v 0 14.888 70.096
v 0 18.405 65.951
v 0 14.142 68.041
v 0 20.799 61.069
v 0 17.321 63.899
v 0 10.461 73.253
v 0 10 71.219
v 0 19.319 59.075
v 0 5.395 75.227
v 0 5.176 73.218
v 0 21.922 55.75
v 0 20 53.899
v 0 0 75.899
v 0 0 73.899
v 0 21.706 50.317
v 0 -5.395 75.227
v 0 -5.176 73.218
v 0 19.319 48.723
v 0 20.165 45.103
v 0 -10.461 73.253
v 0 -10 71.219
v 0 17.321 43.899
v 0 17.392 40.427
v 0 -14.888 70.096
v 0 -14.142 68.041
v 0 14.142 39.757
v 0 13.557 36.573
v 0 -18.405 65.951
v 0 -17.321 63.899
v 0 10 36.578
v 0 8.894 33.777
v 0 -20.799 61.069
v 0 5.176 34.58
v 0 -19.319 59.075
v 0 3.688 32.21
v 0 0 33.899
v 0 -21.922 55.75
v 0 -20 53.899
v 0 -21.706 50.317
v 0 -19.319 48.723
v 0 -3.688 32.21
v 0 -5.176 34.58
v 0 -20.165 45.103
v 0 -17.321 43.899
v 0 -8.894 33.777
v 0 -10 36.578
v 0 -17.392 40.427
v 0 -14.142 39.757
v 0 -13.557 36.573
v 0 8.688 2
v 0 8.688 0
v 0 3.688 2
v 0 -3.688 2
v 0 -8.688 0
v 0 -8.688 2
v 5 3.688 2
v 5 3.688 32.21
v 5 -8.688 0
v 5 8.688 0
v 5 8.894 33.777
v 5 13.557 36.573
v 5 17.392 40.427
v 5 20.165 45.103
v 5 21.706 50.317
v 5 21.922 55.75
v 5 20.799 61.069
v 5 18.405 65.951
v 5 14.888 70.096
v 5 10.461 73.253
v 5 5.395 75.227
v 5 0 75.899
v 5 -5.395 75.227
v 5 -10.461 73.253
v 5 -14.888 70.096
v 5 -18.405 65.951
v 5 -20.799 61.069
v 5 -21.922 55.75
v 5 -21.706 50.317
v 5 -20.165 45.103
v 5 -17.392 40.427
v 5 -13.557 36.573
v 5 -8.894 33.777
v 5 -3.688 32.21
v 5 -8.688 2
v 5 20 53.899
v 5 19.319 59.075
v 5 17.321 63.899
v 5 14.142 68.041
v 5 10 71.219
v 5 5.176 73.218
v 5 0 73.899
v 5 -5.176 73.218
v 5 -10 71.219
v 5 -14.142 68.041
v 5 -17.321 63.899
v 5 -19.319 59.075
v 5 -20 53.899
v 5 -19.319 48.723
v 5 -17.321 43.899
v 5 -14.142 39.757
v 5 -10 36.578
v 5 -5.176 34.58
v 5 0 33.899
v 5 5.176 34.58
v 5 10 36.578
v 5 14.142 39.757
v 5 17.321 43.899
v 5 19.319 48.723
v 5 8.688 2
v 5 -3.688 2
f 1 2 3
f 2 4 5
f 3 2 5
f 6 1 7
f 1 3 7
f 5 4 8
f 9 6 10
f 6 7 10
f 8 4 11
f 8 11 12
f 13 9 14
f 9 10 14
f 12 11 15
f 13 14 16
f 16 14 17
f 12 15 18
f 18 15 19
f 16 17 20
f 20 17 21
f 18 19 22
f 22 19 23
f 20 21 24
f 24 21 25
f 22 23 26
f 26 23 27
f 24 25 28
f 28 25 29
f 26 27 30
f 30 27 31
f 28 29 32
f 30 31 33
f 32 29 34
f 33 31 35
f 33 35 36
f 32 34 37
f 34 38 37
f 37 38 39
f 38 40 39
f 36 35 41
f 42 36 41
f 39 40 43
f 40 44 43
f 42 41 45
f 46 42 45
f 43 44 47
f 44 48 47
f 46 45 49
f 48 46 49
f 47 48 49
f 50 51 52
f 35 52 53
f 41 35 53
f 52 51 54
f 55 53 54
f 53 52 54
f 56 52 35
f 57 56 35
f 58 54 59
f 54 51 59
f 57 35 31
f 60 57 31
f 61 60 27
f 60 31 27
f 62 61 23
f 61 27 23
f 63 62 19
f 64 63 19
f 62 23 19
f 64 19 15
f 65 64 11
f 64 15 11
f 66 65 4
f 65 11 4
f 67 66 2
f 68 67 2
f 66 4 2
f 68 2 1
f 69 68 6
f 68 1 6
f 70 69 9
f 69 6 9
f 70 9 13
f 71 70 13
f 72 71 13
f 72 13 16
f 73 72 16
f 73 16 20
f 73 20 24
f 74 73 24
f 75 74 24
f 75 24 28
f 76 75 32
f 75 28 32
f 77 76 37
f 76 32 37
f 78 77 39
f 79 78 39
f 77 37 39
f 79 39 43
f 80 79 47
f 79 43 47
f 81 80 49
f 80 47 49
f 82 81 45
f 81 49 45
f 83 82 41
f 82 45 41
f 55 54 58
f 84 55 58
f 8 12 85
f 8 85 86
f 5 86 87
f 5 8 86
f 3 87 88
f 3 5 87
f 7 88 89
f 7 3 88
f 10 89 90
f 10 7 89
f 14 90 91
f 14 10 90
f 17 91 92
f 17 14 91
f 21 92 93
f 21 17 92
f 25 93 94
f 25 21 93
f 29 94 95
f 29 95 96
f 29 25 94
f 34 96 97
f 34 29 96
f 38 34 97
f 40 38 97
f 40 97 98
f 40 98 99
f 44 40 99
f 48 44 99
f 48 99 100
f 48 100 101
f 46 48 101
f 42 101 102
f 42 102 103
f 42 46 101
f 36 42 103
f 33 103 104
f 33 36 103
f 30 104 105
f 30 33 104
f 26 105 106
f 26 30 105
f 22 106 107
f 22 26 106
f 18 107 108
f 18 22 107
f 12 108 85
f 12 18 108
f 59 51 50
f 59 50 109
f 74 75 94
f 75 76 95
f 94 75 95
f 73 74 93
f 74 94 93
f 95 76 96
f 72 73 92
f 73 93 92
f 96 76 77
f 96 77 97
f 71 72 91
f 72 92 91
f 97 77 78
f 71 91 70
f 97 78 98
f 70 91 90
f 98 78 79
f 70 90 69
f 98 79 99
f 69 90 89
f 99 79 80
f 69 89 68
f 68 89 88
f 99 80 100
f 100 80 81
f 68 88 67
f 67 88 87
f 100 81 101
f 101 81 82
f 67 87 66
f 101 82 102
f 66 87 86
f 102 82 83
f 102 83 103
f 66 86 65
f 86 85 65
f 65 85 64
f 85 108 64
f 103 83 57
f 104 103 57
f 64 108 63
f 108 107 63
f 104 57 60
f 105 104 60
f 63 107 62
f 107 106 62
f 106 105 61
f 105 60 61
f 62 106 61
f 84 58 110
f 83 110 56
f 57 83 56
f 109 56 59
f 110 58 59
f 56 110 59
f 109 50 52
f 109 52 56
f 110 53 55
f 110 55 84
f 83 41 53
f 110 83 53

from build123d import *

# Parameters (mm, degrees)
F0_R     = 20
F1_DEPTH = 5
F2_W     = 5
F2_H     = 7.376282
F2_H_2   = 5
F3_DEPTH = 2


with BuildPart() as f1:
    # F0 (on Right) → F1 (new body)
    with BuildSketch(Plane.YZ):
        with BuildLine():
            Line((3.688141, 0), (3.688141, 32.210336))
            ThreePointArc((3.688141, 32.210336), (0, 75.898988), (-3.688141, 32.210336))
            Line((-3.688141, 32.210336), (-3.688141, 0))
            Line((-3.688141, 0), (3.688141, 0))
        make_face()
        with Locations((0, 53.898988)):
            Circle(F0_R, mode=Mode.SUBTRACT)
    extrude(amount=F1_DEPTH)

    # F2 (on Top) → F3 (join)
    with BuildSketch(Plane.XY):
        with Locations((2.5, 0)):
            Rectangle(F2_W, F2_H)
        with Locations((2.5, -6.188141)):
            Rectangle(F2_W, F2_H_2)
        with Locations((2.5, 6.188141)):
            Rectangle(F2_W, F2_H_2)
    extrude(amount=F3_DEPTH)


solid = f1.part
